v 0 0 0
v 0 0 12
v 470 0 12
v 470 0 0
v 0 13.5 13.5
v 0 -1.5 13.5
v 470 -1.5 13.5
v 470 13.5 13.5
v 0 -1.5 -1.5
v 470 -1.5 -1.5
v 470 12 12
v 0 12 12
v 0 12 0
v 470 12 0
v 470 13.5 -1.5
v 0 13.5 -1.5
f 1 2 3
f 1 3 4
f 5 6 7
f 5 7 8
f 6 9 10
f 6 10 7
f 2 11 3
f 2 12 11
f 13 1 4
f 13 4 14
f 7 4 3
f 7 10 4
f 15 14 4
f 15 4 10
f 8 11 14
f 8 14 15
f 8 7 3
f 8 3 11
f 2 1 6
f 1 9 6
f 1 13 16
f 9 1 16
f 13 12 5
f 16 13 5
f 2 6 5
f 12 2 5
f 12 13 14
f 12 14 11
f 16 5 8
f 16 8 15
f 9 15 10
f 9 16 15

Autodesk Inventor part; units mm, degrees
ref_plane "YZ Plane" through (0, 0, 0) normal (1, 0, 0) x (0, 1, 0)
ref_plane "XZ Plane" through (0, 0, 0) normal (0, 1, 0) x (-1, 0, 0)
ref_plane "XY Plane" through (0, 0, 0) normal (0, 0, 1) x (1, 0, 0)
sketch "Sketch1" plane through (0, 0, 0) normal (1, 0, 0) x (0, 1, 0)
  line L0 (0, 0) -> (12, 0)
  line L1 (12, 0) -> (12, 12)
  line L2 (12, 12) -> (0, 12)
  line L3 (0, 12) -> (0, 0)
  line L4 (-1.5, 13.5) -> (13.5, 13.5)
  line L5 (13.5, 13.5) -> (13.5, -1.5)
  line L6 (13.5, -1.5) -> (-1.5, -1.5)
  line L7 (-1.5, -1.5) -> (-1.5, 13.5)
  dimension "d0" = 1.5
  dimension "d1" = 12
  dimension "d2" = 12
extrude "Extrusion1" add sketch "Sketch1" along normal blind 470
equation "\"d0\" = ZártSzelvényFalVastagság"
equation "\"d1\" = ZártSzelvényBelsőÁtmérő"
equation "\"d2\" = ZártSzelvényBelsőÁtmérő"
equation "\"ZártSzelvényFalVastagság\" = 1.5"
equation "\"ZártSzelvényBelsőÁtmérő\" = 12"
equation "\"CsapágyHázKülsőÁtmérő\" = 32"
equation "\"ZártSzelvényKülsőÁtmérő\" = 15"
equation "\"CsapágyBelsőÁtmérő\" = 12"
equation "\"CsapágyKülsőÁtmérő\" = 28"
equation "\"CsapágyHázBelsőÁtmérő\" = 26"
equation "\"CsapágyHázHoszza\" = 45"
equation "\"CsapágySzélesége\" = 8"
properties part number "KétvégenMartSzelvény" material "Acetal Resin, Black"
